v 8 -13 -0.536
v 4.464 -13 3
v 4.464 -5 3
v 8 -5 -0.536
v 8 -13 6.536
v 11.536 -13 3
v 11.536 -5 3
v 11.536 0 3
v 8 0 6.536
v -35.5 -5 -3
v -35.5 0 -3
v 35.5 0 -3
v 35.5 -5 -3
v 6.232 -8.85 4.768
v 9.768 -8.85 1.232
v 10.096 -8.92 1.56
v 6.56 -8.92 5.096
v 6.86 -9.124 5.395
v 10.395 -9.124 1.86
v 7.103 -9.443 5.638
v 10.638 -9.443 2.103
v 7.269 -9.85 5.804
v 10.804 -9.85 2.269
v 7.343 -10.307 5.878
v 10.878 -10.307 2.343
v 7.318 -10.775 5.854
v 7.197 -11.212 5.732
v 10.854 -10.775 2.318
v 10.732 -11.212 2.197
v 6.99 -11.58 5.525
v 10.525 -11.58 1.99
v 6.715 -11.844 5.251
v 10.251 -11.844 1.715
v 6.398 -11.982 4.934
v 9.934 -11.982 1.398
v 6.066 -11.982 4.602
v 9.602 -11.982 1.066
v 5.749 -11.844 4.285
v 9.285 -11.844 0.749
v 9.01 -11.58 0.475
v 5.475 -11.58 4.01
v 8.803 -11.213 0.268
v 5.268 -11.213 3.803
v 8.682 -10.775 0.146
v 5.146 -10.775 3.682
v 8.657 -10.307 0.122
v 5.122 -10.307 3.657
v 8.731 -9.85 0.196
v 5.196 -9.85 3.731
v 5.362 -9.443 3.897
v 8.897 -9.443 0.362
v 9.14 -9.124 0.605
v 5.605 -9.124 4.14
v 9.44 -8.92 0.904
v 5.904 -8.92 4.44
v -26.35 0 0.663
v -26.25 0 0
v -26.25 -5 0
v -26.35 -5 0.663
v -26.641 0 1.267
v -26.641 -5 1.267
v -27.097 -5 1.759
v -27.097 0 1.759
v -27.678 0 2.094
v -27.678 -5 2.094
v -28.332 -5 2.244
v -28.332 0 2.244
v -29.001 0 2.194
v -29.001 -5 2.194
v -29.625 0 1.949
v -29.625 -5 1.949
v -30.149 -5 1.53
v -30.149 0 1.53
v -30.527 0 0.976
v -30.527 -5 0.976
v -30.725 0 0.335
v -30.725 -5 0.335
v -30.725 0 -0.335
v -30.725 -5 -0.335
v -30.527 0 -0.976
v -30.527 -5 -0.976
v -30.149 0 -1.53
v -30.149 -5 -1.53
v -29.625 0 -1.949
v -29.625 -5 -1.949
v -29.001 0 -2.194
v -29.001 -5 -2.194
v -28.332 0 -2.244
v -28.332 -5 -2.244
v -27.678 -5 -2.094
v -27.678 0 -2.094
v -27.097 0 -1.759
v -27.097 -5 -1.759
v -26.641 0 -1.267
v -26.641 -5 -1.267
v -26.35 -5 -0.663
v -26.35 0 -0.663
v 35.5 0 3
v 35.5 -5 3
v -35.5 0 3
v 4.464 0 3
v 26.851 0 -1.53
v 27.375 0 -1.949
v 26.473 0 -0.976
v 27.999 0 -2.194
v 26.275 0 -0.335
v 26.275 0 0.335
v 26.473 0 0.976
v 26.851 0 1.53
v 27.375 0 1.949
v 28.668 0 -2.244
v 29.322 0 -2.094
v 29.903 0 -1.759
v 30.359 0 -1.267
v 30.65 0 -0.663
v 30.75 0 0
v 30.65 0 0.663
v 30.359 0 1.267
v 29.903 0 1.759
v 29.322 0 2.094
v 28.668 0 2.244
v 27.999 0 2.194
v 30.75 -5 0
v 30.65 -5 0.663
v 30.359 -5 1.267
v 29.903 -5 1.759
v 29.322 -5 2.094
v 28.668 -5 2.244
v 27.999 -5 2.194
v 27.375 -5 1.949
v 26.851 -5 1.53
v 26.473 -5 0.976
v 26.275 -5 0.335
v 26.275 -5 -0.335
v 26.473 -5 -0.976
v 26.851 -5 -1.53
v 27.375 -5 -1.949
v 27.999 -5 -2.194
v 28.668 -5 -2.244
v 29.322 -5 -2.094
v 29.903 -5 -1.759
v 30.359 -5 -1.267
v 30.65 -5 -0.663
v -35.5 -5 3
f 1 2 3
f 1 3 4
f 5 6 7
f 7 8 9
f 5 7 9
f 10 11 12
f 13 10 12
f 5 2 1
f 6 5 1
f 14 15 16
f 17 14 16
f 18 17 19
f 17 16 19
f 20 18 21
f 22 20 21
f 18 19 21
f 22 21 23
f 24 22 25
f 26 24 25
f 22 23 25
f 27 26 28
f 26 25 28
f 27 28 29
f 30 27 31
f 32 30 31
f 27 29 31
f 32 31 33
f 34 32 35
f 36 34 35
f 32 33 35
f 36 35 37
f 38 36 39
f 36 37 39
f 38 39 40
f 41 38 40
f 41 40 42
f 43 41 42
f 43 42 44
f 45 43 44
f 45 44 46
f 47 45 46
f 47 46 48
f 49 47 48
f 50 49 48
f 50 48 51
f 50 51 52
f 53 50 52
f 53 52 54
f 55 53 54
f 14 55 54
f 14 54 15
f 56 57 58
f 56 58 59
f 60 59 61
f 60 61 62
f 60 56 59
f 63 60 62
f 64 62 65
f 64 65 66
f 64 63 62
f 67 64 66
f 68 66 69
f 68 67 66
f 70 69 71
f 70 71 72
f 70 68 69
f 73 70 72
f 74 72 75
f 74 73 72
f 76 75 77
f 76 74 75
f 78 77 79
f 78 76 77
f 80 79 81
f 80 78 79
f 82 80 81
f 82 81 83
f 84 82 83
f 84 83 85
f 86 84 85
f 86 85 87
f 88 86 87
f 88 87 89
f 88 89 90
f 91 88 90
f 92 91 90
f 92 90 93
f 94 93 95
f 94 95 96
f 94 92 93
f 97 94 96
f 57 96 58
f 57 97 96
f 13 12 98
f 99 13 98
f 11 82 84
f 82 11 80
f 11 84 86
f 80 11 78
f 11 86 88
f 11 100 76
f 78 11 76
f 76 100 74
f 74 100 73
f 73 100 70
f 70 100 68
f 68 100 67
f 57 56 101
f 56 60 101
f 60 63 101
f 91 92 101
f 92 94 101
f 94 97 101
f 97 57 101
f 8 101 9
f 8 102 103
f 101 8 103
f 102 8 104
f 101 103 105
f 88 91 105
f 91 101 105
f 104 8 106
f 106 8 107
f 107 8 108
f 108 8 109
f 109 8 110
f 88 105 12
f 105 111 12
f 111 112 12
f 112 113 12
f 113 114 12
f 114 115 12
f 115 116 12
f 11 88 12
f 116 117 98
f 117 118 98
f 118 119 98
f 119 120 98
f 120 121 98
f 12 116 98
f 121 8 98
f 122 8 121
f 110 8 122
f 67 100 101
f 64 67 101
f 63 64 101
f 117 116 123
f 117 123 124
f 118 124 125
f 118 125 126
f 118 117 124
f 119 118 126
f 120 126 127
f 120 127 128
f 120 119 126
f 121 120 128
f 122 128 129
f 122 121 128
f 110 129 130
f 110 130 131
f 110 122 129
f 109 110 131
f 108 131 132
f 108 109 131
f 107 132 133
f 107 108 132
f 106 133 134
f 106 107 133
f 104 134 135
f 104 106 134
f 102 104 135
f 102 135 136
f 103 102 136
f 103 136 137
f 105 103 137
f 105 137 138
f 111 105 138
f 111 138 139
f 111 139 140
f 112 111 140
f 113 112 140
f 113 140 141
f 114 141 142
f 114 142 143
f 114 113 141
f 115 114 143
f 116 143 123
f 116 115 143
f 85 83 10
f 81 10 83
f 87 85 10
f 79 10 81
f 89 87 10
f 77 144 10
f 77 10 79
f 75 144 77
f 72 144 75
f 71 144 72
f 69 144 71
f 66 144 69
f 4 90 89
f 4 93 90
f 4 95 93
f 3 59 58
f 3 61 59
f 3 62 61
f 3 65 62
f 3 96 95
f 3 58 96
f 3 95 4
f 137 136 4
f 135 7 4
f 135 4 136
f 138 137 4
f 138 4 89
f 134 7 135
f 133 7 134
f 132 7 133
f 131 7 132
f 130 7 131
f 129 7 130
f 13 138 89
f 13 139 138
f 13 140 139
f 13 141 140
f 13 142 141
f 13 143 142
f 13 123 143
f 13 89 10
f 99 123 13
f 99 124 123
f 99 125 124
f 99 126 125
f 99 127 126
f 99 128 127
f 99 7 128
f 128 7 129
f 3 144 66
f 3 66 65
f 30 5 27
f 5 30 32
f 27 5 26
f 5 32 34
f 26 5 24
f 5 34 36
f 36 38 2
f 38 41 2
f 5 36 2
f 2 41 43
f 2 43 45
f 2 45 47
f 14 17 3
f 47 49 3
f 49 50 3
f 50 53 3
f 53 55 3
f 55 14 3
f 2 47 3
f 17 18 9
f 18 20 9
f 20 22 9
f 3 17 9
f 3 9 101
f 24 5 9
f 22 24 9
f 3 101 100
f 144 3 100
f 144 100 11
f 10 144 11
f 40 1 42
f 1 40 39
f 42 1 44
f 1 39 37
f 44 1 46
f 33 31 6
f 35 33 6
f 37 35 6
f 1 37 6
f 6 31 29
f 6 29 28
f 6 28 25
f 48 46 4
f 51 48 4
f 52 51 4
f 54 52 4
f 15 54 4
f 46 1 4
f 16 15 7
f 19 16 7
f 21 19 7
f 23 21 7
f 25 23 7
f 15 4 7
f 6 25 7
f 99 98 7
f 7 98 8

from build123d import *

# Parameters (mm, degrees)
F0_R     = 2.25
F1_DEPTH = 5
F3_DEPTH = 8
F4_R     = 1.575
F5_DEPTH = 35.7601449816


with BuildPart() as f1:
    # F0 (on Front) → F1 (new body)
    with BuildSketch(Plane.XZ):
        Polygon((35.5, -3), (35.5, 3), (11.5355339059, 3), (8, -0.5355339059), (4.4644660941, 3), (-35.5, 3), (-35.5, -3), align=None)
        with Locations((-28.5, 0)):
            Circle(F0_R, mode=Mode.SUBTRACT)
        with Locations((28.5, 0)):
            Circle(F0_R, mode=Mode.SUBTRACT)
        Polygon((8, -0.5355339059), (11.5355339059, 3), (4.4644660941, 3), align=None)
        Polygon((4.4644660941, 3), (11.5355339059, 3), (8, 6.5355339059), align=None)
    extrude(amount=F1_DEPTH)

    # F2 (on face) → F3 (join)
    with BuildSketch(Plane.XZ.offset(5)):
        Polygon((11.5355339059, 3), (8, 6.5355339059), (4.4644660941, 3), (8, -0.5355339059), align=None)
    extrude(amount=F3_DEPTH)

    # F4 (on face) → F5 (cut, through all)
    with BuildSketch(Plane(origin=(4.267766953, 0, -4.267766953), x_dir=(0, 1, 0), z_dir=(0.7071067812, 0, -0.7071067812))):
        with Locations((-10.425, 7.7781745931)):
            Circle(F4_R)
    extrude(amount=-F5_DEPTH, mode=Mode.SUBTRACT)


solid = f1.part
